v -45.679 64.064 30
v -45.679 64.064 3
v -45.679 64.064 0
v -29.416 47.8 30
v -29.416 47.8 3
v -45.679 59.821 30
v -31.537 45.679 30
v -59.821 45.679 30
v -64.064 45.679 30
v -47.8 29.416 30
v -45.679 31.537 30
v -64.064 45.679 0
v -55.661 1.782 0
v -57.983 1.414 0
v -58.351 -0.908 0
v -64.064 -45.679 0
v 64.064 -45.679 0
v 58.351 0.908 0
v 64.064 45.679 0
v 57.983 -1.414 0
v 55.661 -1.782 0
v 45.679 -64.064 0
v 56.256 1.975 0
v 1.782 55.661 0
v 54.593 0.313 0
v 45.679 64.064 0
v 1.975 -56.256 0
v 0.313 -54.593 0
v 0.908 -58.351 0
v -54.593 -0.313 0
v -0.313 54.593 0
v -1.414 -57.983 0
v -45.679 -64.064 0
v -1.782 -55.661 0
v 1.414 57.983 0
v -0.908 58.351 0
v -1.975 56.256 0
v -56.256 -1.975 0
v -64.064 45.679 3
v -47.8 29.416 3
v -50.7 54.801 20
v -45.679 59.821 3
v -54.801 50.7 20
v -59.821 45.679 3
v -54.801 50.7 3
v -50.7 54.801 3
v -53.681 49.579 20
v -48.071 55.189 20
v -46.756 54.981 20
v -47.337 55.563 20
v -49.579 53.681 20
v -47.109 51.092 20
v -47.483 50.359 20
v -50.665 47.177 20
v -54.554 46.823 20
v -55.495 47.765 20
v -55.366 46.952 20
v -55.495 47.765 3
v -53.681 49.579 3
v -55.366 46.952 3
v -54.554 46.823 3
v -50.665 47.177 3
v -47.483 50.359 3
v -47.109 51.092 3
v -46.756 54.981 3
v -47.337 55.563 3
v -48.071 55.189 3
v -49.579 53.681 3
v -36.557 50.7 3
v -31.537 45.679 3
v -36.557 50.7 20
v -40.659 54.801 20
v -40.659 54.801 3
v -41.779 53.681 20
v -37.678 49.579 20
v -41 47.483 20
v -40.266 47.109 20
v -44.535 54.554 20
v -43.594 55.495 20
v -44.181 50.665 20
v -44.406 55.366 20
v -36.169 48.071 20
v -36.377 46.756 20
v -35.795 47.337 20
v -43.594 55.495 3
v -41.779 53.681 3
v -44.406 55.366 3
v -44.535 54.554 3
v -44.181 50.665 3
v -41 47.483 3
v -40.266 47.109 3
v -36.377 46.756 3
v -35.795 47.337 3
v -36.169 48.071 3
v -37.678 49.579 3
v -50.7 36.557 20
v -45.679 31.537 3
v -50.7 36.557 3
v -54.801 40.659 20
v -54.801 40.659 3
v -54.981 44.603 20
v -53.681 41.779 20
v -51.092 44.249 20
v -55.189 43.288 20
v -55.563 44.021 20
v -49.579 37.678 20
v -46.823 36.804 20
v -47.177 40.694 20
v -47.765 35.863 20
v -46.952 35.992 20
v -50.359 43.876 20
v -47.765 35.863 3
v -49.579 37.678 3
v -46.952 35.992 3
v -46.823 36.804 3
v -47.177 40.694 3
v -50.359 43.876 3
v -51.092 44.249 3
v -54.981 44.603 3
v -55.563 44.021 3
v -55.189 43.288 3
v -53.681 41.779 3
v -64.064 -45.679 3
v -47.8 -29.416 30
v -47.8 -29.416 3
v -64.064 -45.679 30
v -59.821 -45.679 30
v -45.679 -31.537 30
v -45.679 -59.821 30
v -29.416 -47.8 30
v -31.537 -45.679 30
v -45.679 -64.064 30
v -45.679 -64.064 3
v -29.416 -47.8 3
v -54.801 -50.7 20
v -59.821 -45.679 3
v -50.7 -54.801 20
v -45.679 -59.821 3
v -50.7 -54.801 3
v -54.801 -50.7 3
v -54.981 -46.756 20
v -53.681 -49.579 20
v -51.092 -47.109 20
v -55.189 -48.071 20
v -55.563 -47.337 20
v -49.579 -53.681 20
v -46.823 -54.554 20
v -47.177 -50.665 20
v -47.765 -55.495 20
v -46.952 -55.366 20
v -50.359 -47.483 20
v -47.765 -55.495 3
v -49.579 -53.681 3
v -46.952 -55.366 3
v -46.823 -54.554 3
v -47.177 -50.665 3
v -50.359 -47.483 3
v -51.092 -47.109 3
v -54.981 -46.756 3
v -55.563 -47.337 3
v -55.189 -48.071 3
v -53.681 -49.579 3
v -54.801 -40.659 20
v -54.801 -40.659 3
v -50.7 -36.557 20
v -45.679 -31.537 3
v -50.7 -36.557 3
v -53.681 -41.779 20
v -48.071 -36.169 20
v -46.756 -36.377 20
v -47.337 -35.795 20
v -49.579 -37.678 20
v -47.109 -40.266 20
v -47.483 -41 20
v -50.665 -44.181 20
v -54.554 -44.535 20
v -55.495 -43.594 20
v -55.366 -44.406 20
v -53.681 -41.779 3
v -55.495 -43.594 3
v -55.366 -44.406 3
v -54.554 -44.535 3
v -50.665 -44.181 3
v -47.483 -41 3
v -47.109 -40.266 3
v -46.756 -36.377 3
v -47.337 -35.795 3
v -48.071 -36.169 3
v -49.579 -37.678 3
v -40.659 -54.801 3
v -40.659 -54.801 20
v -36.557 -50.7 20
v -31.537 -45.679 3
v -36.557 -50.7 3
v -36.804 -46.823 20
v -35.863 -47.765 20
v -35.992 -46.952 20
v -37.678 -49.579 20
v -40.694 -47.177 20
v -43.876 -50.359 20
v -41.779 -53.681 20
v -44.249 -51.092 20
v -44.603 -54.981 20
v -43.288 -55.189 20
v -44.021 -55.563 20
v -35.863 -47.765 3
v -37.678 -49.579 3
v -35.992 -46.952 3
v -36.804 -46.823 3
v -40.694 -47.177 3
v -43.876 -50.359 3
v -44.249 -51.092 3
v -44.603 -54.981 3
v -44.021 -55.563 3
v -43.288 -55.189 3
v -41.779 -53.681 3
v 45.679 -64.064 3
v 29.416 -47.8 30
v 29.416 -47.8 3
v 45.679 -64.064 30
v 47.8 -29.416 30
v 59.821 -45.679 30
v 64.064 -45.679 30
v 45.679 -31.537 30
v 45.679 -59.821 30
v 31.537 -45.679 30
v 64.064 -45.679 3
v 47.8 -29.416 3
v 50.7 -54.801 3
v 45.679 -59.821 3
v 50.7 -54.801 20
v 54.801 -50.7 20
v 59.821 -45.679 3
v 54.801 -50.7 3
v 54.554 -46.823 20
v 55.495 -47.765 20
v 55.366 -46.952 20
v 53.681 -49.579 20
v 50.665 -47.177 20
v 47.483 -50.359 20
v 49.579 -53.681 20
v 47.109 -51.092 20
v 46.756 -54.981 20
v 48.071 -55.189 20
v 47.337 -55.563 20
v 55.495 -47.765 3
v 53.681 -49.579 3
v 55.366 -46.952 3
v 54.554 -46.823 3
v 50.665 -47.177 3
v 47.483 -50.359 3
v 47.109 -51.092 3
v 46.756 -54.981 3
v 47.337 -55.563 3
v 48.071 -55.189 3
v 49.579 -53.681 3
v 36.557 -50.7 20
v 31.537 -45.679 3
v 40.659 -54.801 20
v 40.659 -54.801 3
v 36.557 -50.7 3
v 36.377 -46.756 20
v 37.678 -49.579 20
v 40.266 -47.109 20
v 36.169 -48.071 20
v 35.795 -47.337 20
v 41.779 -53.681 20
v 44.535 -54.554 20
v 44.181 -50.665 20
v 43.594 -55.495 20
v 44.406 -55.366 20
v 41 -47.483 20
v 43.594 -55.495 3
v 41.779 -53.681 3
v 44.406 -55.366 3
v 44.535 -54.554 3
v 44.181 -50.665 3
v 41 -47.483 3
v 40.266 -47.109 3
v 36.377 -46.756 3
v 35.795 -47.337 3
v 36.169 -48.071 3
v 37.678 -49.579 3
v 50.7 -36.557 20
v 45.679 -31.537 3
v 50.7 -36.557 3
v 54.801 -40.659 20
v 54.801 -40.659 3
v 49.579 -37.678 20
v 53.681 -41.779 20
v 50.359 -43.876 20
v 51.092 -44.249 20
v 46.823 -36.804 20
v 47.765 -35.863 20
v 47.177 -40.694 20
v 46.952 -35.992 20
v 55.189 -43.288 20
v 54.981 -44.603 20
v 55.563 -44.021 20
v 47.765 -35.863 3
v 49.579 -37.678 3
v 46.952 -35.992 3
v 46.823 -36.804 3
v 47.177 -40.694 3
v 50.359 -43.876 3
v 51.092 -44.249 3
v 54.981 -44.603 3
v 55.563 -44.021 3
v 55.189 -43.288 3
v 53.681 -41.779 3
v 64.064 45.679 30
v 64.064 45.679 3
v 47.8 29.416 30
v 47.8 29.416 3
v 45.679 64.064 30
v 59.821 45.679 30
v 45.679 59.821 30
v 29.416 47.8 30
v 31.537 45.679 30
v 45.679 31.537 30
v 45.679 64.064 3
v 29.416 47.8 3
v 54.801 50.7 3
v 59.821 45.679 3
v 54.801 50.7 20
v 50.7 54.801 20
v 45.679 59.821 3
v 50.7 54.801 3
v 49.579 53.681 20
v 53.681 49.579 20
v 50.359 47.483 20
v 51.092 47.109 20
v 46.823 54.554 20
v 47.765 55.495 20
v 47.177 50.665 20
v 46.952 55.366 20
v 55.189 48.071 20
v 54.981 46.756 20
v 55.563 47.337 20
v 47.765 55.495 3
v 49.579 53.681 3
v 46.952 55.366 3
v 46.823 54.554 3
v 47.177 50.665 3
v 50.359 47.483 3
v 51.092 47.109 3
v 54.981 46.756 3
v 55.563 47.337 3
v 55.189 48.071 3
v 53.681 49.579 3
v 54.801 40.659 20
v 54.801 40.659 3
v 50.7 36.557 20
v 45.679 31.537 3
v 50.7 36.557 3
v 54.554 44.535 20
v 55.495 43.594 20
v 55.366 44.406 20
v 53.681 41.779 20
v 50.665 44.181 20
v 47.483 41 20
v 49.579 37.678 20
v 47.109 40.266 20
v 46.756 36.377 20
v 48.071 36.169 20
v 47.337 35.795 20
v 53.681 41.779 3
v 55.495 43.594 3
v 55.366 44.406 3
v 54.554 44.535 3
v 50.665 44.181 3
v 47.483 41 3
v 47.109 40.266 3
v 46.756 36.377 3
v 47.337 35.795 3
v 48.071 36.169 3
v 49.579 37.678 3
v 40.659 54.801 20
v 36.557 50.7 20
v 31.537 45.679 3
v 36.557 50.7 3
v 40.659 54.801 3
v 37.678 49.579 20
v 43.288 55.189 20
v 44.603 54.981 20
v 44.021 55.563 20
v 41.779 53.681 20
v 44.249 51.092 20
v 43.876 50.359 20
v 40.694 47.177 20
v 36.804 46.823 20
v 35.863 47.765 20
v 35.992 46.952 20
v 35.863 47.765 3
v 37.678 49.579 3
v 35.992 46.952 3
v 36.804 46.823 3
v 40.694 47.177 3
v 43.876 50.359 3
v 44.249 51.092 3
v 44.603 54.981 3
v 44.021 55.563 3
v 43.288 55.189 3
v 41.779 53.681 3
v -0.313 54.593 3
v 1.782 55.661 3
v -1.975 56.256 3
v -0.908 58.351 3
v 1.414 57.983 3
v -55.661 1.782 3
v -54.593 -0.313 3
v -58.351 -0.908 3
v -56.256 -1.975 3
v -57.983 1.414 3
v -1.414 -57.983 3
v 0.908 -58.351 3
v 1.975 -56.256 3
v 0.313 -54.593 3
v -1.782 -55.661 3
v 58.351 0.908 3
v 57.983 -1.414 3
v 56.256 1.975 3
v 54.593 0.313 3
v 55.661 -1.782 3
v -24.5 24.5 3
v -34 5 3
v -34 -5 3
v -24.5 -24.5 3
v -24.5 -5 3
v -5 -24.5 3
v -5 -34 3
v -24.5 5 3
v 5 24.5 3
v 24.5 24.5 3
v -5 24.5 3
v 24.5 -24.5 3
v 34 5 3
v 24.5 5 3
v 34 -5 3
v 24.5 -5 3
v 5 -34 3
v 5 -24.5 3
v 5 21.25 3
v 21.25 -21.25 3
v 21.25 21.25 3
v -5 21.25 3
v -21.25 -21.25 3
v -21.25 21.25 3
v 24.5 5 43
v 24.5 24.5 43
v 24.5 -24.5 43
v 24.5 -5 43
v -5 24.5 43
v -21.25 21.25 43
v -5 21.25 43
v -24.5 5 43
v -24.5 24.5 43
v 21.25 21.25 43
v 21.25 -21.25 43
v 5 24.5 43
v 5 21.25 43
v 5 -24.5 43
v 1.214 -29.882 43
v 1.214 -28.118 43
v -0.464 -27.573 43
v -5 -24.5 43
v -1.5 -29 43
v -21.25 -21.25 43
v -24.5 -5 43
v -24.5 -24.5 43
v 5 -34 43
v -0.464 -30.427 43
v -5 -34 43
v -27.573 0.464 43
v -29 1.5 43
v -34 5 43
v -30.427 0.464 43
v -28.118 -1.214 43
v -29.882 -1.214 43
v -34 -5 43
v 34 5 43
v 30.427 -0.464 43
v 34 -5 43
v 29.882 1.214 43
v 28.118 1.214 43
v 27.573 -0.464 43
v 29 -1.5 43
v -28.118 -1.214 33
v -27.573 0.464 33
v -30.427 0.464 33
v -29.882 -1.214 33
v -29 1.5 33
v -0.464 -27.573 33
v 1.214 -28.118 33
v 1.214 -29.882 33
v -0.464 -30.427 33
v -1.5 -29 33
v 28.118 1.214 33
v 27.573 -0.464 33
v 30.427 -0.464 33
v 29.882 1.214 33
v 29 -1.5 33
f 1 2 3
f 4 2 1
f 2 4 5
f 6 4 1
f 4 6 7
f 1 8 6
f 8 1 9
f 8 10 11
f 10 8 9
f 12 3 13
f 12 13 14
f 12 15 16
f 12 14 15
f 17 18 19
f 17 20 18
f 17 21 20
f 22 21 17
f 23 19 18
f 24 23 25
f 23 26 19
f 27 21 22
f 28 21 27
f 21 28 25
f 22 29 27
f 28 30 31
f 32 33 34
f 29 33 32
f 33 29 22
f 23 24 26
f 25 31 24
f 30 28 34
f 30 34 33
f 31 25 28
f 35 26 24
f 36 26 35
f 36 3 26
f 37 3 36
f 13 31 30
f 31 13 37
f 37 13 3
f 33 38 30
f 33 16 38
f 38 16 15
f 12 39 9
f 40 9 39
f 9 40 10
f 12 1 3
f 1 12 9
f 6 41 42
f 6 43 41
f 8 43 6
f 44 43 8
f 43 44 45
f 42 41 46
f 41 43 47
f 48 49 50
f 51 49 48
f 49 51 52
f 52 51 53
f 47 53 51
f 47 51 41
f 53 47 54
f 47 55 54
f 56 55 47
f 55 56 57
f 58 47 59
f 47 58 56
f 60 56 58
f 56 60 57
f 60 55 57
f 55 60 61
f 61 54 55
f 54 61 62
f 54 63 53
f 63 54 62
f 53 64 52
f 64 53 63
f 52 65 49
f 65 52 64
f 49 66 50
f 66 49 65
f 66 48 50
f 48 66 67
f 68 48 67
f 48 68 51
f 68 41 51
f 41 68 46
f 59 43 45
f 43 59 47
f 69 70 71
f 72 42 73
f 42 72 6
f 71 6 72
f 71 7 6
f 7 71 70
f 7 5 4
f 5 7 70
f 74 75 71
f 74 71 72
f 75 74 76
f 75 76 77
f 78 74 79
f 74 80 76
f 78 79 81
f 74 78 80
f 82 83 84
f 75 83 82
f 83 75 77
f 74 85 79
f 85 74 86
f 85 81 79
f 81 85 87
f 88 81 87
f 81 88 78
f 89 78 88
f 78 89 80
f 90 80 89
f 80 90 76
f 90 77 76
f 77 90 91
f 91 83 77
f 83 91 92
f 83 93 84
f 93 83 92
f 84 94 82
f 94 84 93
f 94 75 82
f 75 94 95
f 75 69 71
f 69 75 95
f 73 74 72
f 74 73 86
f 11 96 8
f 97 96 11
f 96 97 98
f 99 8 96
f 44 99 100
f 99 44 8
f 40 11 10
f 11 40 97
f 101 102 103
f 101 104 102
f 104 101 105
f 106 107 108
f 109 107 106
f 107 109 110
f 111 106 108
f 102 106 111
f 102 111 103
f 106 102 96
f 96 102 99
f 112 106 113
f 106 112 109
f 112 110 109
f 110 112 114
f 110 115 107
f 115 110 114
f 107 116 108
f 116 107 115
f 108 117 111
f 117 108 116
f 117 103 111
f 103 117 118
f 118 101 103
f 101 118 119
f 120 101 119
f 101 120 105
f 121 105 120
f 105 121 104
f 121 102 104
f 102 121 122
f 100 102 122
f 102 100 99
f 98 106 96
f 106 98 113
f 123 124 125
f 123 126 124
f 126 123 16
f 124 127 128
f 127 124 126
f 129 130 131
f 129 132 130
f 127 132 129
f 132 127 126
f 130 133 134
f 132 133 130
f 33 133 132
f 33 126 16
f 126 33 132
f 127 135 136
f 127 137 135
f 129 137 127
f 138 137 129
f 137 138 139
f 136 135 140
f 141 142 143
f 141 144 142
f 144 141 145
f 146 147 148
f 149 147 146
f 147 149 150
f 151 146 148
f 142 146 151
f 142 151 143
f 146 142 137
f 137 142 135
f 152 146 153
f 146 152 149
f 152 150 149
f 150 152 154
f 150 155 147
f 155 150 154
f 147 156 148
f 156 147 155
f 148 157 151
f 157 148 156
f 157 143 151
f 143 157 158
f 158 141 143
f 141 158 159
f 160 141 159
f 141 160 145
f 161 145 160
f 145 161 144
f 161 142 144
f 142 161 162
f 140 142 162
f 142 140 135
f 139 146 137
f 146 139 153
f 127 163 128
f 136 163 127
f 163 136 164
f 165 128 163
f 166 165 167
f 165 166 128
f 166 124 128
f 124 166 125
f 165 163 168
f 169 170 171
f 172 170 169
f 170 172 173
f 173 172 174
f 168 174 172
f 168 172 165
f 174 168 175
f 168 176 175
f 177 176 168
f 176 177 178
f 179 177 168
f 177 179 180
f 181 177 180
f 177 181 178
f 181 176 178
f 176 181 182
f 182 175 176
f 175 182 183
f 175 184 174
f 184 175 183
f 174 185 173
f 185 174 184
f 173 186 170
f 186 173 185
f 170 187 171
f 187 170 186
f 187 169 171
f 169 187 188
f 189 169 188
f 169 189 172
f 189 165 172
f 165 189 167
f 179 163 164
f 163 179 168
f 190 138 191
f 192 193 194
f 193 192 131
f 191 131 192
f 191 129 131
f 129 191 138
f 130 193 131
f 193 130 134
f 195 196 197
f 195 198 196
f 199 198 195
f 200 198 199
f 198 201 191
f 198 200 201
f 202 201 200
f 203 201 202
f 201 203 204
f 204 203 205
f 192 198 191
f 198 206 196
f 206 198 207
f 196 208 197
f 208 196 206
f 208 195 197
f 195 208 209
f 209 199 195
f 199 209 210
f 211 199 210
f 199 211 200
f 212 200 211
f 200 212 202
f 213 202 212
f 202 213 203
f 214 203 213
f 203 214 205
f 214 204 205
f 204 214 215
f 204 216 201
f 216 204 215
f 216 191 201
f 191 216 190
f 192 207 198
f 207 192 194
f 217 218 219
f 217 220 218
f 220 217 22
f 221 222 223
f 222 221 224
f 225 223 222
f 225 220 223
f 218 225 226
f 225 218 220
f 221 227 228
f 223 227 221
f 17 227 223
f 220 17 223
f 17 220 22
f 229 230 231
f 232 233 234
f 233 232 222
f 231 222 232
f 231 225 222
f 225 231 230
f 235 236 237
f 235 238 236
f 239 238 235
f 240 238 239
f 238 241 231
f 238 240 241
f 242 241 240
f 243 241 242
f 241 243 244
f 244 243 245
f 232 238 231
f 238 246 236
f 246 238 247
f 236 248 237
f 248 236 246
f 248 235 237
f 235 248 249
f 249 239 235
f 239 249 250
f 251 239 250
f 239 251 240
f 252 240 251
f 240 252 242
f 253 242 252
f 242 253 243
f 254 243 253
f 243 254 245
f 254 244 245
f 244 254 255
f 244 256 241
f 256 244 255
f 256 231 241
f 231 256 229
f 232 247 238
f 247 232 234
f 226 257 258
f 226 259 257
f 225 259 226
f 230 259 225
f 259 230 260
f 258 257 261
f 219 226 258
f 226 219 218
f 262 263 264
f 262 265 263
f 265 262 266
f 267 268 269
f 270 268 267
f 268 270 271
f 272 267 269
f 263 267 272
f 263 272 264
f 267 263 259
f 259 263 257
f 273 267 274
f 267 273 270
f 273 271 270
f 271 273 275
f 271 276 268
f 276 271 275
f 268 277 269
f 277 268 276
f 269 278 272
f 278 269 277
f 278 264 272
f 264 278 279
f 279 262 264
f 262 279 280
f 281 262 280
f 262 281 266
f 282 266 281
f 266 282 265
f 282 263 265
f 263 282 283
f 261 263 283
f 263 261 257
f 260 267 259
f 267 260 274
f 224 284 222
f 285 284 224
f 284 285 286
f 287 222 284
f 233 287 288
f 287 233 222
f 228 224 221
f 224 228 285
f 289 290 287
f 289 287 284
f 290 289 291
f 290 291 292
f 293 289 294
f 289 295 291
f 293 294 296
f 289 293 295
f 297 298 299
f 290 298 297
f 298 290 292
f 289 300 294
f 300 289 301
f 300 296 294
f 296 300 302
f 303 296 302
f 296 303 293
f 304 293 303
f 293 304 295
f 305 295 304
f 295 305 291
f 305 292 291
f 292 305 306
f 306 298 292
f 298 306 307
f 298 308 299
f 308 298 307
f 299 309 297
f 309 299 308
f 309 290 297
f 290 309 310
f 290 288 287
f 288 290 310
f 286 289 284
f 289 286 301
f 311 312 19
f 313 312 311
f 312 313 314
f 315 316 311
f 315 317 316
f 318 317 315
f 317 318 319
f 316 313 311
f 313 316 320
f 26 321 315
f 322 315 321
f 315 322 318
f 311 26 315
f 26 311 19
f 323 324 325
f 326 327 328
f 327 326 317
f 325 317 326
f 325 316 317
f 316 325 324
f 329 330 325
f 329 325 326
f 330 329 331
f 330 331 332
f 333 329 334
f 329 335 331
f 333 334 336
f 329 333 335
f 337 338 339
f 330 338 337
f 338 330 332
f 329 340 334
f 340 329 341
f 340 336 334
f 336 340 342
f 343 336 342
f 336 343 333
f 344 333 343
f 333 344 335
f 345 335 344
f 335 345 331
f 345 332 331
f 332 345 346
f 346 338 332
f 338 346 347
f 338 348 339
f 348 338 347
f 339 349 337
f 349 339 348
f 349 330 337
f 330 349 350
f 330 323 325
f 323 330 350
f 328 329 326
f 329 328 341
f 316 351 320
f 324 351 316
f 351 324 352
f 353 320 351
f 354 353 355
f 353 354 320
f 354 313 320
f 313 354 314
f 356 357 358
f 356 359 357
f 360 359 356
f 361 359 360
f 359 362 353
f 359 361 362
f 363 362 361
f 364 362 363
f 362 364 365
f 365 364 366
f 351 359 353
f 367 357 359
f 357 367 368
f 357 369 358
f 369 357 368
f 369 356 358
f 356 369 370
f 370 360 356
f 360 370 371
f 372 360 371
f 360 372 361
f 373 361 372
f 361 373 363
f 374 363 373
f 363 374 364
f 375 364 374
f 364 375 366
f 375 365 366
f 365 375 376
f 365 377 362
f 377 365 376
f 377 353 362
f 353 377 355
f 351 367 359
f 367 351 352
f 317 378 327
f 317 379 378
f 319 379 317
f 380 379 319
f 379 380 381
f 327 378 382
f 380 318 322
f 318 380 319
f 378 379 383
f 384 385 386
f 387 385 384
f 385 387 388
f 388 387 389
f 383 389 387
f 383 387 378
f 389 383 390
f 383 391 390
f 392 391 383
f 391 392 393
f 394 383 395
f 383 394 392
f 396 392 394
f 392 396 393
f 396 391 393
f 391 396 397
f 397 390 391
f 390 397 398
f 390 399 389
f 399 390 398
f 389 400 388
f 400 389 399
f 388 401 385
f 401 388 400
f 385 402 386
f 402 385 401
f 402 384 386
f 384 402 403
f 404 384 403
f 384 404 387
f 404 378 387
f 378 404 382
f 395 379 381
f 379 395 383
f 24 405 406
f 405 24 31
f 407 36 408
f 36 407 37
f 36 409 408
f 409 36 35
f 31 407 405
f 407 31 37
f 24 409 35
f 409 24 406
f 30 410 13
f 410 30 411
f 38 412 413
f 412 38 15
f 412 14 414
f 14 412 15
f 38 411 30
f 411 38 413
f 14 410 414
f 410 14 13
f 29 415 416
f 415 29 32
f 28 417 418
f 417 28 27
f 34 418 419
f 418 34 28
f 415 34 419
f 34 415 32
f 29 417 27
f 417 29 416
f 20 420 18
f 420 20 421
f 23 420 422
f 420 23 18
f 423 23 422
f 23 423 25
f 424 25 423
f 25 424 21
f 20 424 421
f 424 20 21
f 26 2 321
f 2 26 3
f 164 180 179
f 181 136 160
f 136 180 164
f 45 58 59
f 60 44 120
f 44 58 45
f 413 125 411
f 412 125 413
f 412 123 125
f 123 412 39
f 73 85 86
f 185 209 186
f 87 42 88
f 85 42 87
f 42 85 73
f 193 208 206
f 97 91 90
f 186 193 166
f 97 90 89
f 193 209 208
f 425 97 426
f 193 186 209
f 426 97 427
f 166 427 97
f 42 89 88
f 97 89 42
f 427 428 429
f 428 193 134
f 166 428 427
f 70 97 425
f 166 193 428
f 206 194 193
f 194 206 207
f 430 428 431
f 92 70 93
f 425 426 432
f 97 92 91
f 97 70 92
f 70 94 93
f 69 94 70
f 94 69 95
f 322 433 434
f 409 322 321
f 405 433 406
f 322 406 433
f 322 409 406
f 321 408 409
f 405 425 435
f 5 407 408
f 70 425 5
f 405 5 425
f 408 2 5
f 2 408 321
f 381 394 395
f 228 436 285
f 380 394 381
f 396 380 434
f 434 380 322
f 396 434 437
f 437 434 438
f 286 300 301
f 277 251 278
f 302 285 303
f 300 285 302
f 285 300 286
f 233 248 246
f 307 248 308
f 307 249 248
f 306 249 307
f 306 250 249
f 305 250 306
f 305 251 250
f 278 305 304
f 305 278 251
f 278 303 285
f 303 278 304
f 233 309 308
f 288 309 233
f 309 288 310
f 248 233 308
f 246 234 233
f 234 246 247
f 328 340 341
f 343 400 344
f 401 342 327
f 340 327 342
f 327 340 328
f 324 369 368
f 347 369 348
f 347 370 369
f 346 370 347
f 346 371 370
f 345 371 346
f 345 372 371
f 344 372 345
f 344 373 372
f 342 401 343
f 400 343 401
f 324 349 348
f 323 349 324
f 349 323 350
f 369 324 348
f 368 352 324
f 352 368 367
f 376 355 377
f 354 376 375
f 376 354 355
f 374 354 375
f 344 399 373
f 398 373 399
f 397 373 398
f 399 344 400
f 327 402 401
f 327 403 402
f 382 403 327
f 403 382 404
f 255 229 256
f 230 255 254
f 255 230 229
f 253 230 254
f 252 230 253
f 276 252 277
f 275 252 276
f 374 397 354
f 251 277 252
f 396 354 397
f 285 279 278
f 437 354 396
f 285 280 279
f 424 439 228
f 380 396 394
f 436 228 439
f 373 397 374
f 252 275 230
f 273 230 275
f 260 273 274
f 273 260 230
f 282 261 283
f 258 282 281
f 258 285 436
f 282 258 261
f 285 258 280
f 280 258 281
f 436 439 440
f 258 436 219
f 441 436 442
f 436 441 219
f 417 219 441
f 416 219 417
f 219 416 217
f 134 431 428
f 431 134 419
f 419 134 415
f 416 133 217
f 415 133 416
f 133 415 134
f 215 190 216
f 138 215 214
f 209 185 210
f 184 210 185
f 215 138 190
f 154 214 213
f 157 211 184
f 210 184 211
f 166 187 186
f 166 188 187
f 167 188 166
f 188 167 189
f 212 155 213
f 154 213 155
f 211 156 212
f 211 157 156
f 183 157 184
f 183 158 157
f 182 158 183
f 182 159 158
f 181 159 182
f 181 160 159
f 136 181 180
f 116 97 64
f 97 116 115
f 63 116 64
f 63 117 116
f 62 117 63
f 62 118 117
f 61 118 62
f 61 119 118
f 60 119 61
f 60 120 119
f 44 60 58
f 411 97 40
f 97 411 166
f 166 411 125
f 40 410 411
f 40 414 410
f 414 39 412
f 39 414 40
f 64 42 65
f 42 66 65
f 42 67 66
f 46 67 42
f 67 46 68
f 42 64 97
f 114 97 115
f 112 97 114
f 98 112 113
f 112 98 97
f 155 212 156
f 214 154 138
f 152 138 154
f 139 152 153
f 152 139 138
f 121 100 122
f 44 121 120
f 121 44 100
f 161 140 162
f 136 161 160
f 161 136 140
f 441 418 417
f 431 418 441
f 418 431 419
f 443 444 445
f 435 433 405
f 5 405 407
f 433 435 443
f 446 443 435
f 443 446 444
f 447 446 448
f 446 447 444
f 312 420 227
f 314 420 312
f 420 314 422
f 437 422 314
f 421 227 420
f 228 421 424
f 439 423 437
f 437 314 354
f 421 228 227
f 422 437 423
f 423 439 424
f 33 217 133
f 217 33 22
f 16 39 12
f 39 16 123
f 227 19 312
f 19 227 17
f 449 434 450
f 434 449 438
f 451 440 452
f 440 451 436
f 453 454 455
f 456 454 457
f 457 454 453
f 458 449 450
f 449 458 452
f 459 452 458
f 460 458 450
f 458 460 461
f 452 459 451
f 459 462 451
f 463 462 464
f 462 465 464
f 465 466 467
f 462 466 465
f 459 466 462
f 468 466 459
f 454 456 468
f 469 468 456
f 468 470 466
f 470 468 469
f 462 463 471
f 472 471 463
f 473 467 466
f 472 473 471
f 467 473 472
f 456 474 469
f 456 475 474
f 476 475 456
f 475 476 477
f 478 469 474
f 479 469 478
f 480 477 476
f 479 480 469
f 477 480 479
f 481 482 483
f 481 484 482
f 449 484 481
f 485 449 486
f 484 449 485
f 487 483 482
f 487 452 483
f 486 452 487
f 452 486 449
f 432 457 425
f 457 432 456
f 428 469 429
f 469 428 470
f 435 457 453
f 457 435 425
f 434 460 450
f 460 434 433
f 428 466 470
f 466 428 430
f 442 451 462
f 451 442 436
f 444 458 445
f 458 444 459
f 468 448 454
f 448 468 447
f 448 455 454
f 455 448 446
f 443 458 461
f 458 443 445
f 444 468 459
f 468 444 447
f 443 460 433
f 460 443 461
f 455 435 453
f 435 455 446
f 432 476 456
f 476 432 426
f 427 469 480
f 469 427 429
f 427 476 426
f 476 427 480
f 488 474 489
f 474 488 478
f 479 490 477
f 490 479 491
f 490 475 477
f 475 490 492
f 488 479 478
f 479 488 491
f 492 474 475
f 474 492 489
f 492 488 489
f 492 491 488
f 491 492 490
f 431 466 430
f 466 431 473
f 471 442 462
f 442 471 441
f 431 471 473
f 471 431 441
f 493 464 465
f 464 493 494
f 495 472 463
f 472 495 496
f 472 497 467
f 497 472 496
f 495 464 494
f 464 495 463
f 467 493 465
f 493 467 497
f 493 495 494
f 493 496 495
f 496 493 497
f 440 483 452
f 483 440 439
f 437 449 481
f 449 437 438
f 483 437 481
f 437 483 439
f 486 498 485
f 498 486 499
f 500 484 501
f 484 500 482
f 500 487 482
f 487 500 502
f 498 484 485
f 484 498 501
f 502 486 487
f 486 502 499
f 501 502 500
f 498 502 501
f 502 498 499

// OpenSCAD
largeurSupport = 26;
taillePlatine = 155.2;
tailleMoteur = 40;
hauteurSupport = 30;
epaisseurPlatine = 3;
$fn = 5;

rotate(45) union() {
	for (i = [0 : 3]) {
		rotate([0, 0, i * 90]) {
			translate([0, 54.6,0]) support();
		}
	}
	difference() {
		platine();
		for (i = [0 : 3]) {
			rotate([0, 0, i * 90]) translate([40, 40,0]) trouDeVis();
		}
	}
	supportMoteur();
}

module support() {
	union() {
		translate([-13, 20, 0]) cube([26, 3, hauteurSupport]);
		translate([0, 20, 0]) rotate(180) fleche();
		translate([10, 0, 0]) cube([3, 23, hauteurSupport]);
		translate([10, 10, 0]) rotate(90) fleche();
		translate([-13, 0, 0]) cube([3, 23, hauteurSupport]);
		translate([-10, 10, 0]) rotate(-90) fleche();
	}
}

module platine() {
	linear_extrude(height = epaisseurPlatine, center = false, convexity = 10, twist = 0)
	polygon([	[-taillePlatine / 2, largeurSupport / 2], [-largeurSupport / 2, taillePlatine / 2],
				[largeurSupport / 2, taillePlatine / 2], [taillePlatine / 2, largeurSupport / 2],
				[taillePlatine / 2, -largeurSupport / 2], [largeurSupport / 2, -taillePlatine / 2],
				[-largeurSupport / 2, -taillePlatine / 2], [-taillePlatine / 2, -largeurSupport / 2]
	]);
}

module fleche() {
	linear_extrude(height = 20, center = false, convexity = 10, twist = 0)
	union() {
		translate([-2.9, 0, 0]) square([5.8, 5]);
		hull() {
			translate([5.25, 2.25, 0]) circle(0.7, true);
			translate([-5.25, 2.25, 0]) circle(0.7, true);
			translate([-2.25, 4.75, 0]) circle(0.7, true);
			translate([2.25, 4.75, 0]) circle(0.7, true);
		}
	}
}

module trouDeVis() {
	cylinder(h = 20, r = 2, center = true);
}

module supportMoteur() {
	rotate(-45) union() {
		difference() {
			translate([-24.5, -24.5, 0]) cube([49, 49, tailleMoteur + epaisseurPlatine]);
			translate([-21.25, -21.25, -10]) cube([42.5, 42.5, 60]);
			translate([-5, 20, -10])cube([10, 10, 60]);
		}
		for (i = [1 : 3]) {
			rotate([0, 0, i * 90]) translate([-5, 24, 0]) {
				difference() {
					cube([10, 10, tailleMoteur + epaisseurPlatine]);
					translate([5, 5, tailleMoteur + epaisseurPlatine]) cylinder(h = 20, r = 1.5, center = true); 
				}
			}
		}
		
	}
}
